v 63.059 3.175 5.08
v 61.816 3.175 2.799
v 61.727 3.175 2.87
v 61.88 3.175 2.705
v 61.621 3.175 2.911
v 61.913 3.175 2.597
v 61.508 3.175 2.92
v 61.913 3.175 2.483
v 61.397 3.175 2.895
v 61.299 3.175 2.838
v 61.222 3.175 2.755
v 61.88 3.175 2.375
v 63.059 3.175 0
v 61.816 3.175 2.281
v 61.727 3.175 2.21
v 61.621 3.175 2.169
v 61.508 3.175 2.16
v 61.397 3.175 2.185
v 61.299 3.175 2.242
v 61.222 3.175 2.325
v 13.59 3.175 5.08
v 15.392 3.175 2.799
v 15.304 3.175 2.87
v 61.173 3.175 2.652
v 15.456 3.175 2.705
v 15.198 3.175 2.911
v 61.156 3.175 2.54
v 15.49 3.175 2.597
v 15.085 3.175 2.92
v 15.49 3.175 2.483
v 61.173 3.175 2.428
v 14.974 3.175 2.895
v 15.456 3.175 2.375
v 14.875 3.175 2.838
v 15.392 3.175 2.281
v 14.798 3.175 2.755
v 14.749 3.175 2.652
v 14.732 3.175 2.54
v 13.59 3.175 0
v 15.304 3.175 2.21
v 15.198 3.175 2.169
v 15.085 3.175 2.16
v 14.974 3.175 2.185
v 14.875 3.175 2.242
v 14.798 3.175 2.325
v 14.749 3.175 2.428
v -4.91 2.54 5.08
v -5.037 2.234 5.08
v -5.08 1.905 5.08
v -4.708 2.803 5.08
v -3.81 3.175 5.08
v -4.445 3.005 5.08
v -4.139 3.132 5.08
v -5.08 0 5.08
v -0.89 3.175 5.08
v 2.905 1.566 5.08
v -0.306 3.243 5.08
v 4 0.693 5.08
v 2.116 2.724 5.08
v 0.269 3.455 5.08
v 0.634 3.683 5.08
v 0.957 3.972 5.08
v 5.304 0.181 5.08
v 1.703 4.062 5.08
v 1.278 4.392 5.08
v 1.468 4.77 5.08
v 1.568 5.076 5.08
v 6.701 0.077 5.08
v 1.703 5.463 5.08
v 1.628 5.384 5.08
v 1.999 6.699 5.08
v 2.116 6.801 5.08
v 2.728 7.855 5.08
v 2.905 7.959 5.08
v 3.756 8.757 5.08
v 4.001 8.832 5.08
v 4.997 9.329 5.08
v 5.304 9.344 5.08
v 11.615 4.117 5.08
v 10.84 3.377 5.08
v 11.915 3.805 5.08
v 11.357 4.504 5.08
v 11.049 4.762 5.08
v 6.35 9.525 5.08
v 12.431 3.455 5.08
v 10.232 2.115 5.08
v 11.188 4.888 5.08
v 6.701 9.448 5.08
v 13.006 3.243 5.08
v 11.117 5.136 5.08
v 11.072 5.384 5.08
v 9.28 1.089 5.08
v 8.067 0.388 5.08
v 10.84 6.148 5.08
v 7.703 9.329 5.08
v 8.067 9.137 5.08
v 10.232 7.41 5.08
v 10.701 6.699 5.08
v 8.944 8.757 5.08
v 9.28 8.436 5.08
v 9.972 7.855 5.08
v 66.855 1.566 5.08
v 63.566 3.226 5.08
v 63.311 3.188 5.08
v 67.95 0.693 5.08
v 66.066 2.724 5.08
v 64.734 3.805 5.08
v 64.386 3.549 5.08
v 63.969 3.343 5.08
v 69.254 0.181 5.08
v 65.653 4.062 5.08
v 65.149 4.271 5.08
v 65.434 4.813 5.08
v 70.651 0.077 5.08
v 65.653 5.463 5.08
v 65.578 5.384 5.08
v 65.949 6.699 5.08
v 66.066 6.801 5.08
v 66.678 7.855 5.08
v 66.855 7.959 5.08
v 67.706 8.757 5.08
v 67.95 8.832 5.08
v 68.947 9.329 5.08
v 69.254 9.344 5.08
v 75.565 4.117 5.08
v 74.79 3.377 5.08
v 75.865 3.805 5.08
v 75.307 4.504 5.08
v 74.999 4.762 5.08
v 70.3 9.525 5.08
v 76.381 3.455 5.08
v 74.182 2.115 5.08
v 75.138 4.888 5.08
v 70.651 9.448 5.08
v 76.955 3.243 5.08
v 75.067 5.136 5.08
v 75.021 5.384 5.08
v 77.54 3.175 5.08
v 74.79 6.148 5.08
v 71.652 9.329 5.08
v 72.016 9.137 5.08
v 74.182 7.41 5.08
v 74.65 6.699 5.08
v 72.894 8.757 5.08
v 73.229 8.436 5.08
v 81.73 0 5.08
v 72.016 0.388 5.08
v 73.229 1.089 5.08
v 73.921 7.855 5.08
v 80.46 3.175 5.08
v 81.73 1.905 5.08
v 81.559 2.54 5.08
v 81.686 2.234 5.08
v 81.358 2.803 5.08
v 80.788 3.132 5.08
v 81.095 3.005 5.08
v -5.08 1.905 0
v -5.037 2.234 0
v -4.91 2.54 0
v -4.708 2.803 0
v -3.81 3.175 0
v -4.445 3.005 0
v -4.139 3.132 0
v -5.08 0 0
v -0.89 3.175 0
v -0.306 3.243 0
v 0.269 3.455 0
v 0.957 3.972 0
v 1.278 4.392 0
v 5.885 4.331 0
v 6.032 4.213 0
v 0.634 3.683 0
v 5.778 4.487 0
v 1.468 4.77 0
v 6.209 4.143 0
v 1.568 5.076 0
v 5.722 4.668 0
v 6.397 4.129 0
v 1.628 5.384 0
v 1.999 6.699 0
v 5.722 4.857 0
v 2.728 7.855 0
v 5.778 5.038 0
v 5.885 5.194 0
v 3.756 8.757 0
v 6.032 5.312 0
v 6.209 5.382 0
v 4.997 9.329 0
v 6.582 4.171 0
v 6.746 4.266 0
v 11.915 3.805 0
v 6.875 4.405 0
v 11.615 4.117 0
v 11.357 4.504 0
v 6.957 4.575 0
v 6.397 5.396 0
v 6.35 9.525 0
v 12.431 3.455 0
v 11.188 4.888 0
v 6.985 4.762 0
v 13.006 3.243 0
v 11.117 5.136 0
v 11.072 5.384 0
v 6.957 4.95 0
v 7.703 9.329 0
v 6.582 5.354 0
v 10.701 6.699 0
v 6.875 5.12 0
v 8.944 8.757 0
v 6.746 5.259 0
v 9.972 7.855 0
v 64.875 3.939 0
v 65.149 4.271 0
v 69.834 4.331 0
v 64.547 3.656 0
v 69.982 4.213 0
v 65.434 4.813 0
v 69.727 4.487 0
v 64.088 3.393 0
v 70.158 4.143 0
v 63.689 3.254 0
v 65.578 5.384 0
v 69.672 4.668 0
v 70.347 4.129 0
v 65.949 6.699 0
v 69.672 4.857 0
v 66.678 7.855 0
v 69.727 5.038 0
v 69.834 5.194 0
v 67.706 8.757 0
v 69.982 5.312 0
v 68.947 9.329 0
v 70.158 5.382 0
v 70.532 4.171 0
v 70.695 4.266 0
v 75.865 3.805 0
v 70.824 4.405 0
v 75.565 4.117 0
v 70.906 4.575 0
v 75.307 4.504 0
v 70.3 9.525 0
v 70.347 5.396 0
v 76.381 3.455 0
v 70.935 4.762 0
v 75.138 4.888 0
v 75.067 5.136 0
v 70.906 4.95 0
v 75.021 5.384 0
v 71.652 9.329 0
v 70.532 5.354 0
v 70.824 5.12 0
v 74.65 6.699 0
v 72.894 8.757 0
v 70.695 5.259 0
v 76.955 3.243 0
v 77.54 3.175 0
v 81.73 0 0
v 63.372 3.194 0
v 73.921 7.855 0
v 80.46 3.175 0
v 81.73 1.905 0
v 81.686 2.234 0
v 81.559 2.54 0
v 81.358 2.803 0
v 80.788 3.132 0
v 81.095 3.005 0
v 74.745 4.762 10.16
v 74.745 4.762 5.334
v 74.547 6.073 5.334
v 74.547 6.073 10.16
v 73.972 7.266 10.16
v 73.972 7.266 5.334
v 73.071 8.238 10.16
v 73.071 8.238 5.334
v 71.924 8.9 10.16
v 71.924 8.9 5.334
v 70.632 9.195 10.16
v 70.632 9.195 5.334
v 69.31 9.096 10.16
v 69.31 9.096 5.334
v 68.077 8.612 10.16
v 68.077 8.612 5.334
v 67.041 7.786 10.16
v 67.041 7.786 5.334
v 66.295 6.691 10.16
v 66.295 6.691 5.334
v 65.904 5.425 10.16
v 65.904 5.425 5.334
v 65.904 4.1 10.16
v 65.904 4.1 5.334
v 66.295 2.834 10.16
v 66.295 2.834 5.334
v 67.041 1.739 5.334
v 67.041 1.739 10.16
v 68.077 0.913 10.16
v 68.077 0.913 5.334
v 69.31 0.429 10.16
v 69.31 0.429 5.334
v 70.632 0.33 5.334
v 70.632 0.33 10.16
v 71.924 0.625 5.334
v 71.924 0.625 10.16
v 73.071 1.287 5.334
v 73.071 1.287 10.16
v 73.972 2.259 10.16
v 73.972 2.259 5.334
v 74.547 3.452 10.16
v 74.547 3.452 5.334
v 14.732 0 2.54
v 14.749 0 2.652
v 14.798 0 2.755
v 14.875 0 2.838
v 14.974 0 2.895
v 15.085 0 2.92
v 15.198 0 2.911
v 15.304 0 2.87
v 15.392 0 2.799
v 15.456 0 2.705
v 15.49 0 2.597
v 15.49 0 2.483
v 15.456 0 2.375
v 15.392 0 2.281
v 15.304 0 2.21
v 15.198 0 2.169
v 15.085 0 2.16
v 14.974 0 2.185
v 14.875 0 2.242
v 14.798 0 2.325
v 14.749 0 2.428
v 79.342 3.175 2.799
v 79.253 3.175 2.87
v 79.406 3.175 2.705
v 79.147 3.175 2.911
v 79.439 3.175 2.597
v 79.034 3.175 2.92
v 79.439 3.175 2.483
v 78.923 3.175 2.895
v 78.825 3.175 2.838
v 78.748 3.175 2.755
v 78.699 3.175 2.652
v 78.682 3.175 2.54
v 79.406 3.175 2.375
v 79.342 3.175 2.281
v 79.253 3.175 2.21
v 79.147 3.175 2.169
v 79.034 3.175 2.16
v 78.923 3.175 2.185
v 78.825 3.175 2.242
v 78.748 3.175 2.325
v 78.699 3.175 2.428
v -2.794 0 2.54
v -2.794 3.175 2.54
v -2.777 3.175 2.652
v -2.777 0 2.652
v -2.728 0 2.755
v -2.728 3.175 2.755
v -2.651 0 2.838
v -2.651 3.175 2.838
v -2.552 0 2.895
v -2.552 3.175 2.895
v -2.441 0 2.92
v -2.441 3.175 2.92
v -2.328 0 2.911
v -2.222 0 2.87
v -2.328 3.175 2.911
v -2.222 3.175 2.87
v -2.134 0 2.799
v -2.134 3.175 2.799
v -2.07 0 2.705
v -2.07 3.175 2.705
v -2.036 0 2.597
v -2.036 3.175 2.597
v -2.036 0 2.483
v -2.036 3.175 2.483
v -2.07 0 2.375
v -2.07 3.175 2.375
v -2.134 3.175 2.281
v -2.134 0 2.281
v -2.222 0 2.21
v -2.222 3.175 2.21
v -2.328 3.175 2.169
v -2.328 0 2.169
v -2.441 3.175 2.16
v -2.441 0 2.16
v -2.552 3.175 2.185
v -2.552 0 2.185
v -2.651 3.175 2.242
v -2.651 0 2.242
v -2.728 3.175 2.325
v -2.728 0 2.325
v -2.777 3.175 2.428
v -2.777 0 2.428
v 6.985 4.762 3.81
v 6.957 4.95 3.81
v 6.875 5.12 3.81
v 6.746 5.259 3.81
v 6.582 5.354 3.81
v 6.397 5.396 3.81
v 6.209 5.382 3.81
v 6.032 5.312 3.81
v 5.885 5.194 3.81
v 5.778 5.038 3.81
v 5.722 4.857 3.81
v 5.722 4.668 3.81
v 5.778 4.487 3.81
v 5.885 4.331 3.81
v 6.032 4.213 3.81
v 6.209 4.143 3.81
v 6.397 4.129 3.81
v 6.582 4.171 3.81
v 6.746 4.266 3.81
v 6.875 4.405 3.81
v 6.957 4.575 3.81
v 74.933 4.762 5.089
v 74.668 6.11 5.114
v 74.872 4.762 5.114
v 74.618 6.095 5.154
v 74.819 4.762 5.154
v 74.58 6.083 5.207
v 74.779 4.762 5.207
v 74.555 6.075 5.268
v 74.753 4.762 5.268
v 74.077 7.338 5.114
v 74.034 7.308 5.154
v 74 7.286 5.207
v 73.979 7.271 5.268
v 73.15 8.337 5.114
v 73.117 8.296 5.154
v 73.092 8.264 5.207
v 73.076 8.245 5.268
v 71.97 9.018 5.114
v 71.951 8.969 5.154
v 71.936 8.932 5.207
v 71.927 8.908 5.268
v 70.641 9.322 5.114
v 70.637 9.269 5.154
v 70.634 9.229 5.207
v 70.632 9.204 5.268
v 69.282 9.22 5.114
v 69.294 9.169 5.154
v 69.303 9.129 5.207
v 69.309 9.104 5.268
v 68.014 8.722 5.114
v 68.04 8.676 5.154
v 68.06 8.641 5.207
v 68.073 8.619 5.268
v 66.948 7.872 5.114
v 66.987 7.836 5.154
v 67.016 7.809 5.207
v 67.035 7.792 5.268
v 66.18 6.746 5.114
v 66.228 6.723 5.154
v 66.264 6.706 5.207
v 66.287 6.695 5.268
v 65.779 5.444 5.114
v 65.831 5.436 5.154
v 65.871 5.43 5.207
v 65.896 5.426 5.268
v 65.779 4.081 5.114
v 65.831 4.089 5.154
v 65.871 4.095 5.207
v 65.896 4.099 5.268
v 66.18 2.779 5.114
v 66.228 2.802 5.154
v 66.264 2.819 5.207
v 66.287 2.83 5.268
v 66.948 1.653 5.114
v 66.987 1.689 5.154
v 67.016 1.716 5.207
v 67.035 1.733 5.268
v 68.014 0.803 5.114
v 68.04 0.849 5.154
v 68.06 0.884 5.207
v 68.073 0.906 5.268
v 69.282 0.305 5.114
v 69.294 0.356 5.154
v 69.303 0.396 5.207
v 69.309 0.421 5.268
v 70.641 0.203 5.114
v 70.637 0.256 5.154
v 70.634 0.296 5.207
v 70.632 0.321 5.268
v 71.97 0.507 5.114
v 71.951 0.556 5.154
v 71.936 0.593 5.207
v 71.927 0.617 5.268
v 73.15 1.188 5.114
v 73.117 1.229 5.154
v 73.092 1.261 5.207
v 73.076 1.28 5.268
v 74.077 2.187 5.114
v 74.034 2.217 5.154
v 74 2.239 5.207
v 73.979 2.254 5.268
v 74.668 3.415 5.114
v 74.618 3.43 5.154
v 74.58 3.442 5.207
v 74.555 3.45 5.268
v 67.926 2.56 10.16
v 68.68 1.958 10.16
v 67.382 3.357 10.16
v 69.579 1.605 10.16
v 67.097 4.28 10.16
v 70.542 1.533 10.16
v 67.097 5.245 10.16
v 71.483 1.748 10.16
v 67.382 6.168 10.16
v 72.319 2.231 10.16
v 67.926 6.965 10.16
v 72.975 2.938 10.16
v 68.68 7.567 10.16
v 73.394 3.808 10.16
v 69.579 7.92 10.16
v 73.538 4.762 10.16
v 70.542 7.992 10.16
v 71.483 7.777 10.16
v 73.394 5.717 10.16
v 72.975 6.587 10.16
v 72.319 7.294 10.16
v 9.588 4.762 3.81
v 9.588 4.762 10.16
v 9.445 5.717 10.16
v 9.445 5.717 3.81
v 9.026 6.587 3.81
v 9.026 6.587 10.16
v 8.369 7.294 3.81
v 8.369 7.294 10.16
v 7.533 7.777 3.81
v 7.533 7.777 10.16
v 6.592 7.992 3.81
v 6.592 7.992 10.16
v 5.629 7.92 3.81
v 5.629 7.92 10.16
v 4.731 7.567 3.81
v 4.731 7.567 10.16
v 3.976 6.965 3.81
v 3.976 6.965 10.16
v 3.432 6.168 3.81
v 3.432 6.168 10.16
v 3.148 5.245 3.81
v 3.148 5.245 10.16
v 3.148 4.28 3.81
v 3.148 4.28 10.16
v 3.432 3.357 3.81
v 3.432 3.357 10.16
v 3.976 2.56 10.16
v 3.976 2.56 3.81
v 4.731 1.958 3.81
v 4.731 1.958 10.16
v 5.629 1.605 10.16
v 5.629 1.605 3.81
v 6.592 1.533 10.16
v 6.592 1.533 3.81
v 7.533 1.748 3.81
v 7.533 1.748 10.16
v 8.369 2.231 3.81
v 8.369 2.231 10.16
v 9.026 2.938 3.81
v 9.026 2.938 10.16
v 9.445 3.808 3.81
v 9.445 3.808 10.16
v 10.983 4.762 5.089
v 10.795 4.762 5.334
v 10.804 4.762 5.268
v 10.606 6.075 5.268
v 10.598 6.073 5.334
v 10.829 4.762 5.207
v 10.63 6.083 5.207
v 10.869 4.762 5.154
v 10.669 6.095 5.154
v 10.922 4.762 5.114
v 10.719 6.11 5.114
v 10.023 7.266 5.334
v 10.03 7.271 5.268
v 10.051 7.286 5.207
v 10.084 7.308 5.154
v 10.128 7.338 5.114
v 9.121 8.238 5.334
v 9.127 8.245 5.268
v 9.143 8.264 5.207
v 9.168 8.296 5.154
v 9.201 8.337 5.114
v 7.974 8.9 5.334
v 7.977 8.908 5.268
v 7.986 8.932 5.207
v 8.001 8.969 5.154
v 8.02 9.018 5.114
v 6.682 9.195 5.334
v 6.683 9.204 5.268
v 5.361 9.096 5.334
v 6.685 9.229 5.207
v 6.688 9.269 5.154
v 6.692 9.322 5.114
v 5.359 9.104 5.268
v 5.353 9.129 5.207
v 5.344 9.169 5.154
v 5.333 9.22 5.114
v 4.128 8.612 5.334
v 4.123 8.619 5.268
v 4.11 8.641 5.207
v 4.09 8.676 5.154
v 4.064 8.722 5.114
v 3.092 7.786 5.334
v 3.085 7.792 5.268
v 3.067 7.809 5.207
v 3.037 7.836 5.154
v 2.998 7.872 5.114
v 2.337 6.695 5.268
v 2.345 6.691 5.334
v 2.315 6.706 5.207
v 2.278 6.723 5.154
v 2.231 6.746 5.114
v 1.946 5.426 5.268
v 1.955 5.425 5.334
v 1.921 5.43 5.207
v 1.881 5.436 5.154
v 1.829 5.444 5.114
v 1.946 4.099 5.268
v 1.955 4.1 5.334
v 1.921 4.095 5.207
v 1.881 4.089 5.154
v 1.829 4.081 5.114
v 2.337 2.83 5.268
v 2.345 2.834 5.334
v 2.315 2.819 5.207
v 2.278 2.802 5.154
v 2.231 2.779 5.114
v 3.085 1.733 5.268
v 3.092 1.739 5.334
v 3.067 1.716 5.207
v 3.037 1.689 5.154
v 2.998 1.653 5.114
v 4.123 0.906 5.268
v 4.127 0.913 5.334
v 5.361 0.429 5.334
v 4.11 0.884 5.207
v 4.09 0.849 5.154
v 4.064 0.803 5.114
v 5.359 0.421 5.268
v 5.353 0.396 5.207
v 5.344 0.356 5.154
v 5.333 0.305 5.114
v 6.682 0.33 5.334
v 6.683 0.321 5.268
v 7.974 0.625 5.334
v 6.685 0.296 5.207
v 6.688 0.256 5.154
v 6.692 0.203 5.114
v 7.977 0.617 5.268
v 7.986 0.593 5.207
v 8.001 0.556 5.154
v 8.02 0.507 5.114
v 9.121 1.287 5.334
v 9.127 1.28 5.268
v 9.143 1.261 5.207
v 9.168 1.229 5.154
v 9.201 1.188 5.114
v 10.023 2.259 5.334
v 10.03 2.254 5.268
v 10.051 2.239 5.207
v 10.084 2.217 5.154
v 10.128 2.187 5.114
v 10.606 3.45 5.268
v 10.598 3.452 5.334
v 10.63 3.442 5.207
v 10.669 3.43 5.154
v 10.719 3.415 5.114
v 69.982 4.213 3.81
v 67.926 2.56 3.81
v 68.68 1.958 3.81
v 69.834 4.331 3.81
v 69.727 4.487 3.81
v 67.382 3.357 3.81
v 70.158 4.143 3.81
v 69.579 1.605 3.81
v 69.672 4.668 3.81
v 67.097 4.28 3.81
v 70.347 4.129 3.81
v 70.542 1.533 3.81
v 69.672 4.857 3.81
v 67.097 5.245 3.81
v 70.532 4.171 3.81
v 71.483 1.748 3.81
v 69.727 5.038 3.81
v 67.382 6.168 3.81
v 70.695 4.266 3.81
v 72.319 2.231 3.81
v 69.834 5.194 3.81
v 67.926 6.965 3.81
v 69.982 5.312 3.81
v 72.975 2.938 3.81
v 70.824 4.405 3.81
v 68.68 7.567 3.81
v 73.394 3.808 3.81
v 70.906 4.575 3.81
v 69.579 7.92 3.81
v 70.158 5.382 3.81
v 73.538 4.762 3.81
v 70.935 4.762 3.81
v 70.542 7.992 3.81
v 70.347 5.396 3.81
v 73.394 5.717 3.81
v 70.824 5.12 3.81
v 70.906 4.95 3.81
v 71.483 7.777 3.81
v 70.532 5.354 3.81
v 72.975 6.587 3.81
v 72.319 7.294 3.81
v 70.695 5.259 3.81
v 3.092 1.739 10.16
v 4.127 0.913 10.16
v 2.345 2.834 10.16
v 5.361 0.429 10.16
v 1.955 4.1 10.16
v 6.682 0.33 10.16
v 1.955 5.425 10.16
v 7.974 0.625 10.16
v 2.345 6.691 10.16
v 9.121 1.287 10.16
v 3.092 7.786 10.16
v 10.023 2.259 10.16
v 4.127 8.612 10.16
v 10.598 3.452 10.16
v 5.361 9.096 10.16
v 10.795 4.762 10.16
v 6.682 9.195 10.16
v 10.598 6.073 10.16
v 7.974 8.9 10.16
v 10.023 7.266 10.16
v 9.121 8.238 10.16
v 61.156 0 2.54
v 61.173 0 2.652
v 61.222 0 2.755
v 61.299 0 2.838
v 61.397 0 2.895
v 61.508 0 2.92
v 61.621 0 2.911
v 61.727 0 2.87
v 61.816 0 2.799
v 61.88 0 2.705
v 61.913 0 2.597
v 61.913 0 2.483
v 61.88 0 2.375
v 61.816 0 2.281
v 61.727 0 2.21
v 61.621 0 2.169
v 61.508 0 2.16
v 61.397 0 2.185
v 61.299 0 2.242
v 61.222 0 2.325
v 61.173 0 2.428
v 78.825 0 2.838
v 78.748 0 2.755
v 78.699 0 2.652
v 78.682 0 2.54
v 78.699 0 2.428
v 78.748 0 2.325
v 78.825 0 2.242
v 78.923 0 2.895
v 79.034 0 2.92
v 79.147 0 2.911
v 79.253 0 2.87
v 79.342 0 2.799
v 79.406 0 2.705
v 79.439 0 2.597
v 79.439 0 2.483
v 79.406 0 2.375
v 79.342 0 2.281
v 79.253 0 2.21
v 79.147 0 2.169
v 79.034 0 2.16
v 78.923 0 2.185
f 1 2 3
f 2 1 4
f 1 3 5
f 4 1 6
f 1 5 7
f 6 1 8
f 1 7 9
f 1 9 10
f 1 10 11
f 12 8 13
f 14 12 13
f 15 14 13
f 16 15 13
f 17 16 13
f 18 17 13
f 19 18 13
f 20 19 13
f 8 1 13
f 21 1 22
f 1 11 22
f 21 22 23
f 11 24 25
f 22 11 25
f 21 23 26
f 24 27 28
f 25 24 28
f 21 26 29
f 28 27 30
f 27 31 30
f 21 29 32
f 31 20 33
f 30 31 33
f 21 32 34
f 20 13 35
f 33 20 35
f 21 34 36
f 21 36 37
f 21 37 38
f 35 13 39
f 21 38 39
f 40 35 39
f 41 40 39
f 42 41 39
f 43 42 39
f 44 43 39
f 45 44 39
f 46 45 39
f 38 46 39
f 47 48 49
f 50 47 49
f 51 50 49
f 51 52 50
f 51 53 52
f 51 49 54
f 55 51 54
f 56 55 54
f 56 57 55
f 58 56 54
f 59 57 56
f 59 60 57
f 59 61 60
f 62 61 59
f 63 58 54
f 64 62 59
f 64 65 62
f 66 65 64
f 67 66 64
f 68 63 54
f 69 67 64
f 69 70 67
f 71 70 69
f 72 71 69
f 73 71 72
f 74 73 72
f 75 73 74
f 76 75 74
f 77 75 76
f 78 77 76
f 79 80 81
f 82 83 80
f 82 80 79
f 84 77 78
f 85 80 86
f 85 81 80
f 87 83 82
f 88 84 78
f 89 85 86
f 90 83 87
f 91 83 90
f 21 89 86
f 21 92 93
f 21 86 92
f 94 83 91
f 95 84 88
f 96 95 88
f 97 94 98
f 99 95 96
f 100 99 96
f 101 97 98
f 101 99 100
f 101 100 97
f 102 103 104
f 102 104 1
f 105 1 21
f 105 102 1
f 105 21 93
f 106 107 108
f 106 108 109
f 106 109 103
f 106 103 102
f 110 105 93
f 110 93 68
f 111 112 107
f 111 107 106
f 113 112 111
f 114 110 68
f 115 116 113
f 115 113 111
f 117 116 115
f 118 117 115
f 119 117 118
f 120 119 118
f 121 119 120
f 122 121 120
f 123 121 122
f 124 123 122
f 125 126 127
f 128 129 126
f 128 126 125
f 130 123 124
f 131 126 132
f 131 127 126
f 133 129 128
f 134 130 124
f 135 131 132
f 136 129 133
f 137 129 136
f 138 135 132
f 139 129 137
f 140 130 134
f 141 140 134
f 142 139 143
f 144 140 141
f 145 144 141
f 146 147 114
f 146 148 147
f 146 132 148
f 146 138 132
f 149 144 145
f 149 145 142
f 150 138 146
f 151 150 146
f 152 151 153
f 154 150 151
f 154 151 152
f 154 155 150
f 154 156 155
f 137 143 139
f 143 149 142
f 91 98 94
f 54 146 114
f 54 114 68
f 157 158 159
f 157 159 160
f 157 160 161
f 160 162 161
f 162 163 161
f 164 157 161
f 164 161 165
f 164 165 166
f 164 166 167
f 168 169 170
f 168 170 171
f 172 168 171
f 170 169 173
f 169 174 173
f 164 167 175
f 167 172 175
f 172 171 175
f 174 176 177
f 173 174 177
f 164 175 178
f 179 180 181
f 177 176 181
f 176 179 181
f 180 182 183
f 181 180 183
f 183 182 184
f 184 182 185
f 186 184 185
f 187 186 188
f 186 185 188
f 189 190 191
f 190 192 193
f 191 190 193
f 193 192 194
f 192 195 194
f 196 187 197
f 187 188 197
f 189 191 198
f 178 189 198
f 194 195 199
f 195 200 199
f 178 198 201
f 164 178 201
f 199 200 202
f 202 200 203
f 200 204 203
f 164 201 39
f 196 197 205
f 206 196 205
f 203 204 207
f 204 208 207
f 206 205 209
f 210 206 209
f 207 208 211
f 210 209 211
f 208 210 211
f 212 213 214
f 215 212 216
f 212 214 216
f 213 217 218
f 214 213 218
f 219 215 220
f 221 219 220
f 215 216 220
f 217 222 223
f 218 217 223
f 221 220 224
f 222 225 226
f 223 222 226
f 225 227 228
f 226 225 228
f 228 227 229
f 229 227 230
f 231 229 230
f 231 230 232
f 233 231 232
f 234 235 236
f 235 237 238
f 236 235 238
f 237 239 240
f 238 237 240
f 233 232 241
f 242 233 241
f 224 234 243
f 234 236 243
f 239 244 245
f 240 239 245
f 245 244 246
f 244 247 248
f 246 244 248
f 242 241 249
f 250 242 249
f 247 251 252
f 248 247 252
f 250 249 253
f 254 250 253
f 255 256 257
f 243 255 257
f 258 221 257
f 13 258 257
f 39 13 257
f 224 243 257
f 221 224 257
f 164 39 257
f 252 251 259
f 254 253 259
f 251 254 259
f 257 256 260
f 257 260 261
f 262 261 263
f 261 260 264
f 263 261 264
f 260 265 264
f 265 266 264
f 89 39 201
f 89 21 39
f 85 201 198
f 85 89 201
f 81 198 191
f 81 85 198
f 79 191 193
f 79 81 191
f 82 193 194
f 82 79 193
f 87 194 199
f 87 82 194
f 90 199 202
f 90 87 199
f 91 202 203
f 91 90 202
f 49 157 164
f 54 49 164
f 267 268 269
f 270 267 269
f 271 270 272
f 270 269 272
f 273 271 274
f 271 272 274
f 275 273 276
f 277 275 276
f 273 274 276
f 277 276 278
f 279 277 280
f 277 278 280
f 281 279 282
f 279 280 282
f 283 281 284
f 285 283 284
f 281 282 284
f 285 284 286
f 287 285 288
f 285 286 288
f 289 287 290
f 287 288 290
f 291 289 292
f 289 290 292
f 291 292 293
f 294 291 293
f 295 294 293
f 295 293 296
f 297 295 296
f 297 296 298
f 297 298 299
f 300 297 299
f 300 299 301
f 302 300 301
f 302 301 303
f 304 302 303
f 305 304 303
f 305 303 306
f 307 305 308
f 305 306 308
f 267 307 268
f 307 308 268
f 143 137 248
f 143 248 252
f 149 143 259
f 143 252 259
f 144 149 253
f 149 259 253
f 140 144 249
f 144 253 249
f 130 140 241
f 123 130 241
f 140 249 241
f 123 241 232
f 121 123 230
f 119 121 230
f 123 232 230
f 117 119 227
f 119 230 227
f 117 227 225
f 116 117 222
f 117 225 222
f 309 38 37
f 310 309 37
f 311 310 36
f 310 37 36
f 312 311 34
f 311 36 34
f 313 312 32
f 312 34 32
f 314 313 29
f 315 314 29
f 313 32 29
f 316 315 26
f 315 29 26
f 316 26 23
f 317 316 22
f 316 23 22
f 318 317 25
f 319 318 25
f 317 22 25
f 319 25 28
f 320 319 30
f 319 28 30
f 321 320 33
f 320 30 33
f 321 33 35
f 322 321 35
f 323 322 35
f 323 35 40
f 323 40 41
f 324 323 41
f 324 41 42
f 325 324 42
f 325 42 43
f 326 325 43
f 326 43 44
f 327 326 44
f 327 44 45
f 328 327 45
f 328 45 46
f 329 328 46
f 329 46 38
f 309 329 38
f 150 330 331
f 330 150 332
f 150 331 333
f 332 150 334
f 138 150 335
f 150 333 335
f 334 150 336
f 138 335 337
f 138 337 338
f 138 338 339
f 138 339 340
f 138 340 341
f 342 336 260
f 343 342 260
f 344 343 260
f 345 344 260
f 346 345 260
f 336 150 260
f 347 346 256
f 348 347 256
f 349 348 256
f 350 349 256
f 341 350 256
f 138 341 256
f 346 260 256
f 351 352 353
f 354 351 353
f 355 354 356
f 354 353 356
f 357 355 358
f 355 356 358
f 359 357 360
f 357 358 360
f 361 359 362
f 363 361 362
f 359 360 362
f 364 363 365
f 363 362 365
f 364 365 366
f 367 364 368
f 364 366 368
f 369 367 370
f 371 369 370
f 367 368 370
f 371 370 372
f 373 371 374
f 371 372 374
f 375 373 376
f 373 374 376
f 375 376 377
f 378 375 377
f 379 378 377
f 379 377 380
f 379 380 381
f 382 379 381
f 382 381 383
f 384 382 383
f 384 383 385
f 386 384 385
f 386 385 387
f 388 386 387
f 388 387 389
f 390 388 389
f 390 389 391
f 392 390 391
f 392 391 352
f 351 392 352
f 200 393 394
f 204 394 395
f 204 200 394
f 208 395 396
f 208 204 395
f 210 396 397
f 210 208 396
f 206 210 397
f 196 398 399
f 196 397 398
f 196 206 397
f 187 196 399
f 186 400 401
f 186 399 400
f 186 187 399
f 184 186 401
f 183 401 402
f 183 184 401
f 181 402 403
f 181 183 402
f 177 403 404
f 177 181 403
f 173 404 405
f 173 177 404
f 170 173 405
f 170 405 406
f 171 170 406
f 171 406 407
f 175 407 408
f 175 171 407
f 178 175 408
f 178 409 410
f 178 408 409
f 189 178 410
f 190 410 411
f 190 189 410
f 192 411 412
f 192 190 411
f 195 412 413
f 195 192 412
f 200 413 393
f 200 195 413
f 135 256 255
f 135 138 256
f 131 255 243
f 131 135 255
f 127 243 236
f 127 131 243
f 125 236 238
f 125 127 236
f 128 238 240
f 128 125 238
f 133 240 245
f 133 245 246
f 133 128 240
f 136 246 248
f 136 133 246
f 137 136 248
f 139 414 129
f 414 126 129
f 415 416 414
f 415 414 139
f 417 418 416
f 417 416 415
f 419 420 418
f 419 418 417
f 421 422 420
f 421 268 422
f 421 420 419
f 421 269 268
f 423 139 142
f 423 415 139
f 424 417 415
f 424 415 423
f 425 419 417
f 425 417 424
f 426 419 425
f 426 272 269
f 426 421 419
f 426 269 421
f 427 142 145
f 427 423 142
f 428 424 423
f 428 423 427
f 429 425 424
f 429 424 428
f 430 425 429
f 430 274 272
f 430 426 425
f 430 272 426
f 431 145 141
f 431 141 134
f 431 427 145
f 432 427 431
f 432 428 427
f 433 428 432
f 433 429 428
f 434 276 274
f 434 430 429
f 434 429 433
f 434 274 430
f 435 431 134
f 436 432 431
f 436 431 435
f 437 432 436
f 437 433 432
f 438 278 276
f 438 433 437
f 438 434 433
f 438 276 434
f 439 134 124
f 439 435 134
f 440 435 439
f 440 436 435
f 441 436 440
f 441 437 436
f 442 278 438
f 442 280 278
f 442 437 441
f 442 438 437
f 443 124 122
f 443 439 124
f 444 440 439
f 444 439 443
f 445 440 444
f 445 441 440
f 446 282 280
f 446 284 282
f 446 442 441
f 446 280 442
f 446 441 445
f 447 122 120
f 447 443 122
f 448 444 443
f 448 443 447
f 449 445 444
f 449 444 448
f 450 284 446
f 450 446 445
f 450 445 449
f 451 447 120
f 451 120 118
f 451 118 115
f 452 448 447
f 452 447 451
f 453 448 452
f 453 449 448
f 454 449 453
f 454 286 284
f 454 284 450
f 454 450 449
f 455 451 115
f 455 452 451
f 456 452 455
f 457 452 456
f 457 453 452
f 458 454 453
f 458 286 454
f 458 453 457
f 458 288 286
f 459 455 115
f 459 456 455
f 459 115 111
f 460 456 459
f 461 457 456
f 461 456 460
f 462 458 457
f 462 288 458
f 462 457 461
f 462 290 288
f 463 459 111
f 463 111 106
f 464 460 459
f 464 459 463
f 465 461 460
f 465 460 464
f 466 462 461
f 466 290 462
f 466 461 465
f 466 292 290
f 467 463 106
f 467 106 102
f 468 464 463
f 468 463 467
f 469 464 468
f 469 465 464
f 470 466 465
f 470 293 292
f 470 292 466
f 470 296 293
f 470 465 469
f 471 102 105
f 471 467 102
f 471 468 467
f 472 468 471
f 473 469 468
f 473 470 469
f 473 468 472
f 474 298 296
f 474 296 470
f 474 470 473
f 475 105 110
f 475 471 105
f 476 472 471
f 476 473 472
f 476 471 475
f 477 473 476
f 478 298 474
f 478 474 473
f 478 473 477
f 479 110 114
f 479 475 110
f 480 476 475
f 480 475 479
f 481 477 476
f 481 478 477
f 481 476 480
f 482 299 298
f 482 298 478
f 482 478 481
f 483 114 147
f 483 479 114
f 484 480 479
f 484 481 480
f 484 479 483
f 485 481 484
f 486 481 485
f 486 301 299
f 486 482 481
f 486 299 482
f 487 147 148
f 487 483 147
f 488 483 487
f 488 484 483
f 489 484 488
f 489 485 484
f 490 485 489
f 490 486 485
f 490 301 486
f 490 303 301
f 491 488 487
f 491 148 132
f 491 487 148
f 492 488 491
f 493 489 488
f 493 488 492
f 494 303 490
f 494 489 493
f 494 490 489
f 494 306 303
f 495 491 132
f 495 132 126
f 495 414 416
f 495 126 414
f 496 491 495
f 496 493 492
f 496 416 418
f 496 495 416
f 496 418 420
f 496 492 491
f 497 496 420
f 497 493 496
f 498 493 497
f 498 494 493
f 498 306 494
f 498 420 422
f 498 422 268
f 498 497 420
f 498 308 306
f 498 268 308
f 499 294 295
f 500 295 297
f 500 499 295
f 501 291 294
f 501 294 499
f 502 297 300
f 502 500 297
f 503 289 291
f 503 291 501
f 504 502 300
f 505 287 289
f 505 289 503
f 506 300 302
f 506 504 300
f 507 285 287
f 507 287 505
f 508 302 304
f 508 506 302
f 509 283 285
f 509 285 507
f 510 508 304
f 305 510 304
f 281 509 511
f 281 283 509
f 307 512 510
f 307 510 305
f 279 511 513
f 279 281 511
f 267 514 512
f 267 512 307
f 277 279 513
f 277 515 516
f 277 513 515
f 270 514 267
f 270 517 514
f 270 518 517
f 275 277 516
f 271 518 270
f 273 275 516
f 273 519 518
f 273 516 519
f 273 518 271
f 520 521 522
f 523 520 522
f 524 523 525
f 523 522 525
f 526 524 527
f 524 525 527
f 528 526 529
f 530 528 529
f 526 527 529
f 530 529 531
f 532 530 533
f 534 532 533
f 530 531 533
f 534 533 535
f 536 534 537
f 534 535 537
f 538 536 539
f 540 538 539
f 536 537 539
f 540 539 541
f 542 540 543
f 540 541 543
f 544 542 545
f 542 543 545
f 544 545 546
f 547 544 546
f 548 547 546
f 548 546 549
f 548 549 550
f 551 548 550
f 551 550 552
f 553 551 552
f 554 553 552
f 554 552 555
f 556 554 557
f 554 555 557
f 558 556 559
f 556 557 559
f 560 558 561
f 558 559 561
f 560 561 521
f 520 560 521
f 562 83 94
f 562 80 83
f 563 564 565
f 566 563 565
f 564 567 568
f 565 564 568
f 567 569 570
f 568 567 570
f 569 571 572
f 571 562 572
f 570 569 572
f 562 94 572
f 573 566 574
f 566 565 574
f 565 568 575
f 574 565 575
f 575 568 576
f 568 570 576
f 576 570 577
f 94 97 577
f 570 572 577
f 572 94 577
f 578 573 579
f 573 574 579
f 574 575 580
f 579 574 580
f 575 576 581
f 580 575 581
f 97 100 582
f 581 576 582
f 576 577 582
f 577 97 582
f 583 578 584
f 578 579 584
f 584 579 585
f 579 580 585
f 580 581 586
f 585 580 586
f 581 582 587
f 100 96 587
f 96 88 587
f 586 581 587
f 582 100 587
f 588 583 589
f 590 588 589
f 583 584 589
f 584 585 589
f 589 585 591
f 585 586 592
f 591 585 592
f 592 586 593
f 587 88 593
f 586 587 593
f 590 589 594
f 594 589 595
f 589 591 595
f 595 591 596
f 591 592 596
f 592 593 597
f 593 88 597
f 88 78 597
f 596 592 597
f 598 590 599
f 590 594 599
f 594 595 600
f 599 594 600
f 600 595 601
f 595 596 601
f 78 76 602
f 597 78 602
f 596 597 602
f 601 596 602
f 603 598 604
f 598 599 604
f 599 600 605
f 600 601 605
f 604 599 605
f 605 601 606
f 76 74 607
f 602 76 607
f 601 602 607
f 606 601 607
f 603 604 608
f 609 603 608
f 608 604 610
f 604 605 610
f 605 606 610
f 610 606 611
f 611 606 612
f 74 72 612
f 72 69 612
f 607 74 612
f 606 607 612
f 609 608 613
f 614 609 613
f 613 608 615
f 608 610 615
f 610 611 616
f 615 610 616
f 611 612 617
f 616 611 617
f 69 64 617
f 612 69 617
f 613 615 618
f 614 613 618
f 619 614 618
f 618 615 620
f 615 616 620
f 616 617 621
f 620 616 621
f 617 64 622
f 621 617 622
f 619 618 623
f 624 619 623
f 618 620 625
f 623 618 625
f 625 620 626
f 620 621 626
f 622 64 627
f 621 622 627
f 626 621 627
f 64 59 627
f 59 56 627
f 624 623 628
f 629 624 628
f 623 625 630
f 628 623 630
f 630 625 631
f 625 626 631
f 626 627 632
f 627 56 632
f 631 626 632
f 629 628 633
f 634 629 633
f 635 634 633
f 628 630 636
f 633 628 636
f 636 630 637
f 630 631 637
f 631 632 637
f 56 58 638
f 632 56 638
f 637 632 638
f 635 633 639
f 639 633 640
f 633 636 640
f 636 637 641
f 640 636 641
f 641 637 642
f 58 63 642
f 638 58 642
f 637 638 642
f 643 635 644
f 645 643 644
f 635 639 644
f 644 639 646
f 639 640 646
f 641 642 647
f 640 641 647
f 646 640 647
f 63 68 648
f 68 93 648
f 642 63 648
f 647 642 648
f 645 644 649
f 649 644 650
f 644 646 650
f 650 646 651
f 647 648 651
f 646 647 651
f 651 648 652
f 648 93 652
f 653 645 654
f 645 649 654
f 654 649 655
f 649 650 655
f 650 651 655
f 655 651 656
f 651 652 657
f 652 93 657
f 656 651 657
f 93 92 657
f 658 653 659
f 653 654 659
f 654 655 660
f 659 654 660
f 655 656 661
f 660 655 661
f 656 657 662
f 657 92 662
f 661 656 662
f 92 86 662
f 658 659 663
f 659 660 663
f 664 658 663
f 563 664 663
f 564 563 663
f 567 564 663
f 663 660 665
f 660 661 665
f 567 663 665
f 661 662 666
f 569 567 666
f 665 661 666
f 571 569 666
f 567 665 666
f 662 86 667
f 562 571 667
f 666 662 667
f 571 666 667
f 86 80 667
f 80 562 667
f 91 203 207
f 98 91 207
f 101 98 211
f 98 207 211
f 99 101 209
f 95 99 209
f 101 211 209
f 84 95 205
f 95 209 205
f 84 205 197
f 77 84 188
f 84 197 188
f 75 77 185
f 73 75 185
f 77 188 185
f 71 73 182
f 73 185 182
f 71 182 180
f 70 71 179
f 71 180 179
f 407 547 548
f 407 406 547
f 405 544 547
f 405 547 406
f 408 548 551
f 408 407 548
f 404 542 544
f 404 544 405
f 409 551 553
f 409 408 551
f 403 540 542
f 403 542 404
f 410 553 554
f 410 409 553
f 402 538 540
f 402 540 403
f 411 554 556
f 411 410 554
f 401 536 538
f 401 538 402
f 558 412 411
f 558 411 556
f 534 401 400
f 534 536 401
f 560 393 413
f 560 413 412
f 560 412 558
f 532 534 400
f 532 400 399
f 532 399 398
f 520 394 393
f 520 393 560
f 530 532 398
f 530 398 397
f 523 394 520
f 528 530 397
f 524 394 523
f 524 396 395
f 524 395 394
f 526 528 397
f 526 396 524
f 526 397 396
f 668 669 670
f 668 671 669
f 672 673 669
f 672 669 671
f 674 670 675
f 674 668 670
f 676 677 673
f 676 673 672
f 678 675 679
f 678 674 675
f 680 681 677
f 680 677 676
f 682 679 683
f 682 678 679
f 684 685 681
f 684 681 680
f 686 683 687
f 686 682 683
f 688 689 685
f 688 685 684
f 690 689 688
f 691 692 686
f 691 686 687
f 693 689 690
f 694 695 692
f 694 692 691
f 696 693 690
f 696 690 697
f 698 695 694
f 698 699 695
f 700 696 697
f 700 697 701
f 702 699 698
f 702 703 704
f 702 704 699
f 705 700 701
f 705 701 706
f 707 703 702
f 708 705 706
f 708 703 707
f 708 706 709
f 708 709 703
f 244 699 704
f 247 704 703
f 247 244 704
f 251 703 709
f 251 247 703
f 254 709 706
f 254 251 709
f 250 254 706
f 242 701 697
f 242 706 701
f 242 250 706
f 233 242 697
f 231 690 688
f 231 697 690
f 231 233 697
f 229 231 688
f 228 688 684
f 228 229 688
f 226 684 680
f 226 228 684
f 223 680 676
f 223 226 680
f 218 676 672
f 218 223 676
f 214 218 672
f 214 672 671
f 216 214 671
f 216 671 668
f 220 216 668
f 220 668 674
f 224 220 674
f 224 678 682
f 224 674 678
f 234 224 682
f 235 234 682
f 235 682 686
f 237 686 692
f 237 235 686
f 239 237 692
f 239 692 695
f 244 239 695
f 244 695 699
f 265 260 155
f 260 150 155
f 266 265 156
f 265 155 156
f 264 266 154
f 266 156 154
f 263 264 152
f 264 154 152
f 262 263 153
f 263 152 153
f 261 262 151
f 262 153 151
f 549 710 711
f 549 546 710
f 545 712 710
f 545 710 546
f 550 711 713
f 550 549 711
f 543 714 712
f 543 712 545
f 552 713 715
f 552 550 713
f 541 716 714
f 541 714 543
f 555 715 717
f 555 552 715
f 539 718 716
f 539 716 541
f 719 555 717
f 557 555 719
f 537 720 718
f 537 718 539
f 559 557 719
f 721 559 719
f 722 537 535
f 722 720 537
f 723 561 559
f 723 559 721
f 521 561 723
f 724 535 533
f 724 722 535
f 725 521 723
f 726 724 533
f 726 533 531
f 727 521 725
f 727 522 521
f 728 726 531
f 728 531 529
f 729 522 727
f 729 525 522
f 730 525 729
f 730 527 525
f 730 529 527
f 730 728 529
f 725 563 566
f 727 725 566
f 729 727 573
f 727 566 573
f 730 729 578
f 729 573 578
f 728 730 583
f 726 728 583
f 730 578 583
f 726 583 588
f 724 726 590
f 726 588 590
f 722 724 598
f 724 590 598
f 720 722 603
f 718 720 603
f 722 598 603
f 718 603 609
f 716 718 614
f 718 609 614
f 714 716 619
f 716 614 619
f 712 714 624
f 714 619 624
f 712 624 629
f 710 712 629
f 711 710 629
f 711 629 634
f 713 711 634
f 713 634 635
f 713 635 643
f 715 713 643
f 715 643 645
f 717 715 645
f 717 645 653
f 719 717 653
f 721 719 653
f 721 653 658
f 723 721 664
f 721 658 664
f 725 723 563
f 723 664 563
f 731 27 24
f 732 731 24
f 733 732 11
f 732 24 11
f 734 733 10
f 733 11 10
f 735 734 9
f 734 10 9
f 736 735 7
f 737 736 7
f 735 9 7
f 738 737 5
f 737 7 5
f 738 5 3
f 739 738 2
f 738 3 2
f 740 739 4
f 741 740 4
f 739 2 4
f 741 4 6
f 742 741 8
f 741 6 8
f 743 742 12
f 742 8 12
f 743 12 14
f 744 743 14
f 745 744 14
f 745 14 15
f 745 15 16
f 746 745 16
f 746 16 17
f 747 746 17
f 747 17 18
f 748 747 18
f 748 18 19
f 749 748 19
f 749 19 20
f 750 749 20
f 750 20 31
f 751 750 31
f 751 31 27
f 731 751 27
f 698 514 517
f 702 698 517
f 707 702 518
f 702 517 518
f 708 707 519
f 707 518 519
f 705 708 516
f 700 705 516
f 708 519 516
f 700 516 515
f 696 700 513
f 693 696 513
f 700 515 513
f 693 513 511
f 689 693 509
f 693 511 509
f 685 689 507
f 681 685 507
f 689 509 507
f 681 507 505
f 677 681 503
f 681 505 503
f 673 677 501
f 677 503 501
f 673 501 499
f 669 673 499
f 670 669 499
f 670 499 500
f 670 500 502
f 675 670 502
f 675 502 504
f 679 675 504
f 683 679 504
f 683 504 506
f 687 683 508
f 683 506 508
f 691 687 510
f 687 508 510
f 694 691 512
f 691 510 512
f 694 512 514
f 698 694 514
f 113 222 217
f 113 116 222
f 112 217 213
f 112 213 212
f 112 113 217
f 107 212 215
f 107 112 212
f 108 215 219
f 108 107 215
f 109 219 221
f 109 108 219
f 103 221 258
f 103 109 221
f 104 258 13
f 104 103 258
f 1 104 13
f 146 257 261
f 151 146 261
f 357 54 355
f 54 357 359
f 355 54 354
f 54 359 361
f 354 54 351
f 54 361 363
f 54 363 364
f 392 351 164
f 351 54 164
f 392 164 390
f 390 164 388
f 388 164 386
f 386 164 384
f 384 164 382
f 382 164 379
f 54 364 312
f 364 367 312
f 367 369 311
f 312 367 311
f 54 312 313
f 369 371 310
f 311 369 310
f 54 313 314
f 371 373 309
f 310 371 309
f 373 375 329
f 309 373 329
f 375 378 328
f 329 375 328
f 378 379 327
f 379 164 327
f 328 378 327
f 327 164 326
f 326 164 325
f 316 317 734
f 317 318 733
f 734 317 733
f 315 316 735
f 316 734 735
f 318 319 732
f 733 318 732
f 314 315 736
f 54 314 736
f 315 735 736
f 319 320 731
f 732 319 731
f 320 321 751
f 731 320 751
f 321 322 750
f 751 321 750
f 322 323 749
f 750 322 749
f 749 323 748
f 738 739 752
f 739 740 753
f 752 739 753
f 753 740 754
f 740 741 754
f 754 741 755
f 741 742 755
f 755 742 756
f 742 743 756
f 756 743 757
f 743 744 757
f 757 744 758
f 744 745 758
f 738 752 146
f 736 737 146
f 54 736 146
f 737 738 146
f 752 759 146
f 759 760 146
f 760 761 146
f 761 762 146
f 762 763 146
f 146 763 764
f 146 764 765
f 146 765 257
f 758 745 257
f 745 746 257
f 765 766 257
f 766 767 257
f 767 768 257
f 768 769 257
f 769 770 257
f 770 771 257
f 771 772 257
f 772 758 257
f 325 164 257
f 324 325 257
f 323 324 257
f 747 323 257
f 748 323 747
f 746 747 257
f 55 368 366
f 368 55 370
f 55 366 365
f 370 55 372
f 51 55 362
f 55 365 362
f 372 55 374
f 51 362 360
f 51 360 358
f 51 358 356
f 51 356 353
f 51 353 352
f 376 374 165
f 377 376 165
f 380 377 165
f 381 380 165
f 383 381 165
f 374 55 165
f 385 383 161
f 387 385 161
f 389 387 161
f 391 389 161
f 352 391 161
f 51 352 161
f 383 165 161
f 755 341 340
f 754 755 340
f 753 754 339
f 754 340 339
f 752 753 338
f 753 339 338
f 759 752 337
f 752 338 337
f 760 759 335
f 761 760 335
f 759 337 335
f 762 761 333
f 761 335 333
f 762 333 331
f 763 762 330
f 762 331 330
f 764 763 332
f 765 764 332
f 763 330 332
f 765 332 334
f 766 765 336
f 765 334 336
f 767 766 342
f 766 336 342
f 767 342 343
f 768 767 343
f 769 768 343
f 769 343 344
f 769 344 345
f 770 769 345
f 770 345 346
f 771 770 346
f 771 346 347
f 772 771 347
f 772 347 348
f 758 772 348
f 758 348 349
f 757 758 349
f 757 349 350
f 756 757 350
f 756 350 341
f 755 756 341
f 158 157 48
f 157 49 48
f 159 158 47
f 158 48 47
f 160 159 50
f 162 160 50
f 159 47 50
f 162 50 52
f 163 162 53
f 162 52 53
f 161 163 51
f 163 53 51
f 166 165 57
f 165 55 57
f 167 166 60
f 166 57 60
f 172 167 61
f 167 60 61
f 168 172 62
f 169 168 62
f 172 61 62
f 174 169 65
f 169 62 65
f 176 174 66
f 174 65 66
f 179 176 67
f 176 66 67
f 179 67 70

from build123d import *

# Parameters (mm, degrees)
SKETCH1_R           = 0.635
BOSS_EXTRUDE1_DEPTH = 5.08
SKETCH2_R           = 4.445
SKETCH2_R_2         = 0.635
BOSS_EXTRUDE2_DEPTH = 5.08
SKETCH3_R           = 3.2385
CUT_EXTRUDE1_DEPTH  = 6.35
FILLET1_R           = 0.254
FILLET2_R           = 2.54
FILLET3_R           = 1.27
SKETCH5_R           = 0.381
CUT_EXTRUDE3_DEPTH  = 83.603101422


with BuildPart() as part:
    # Sketch1 → Boss-Extrude1 (new body)
    with BuildSketch(Plane.XY):
        with BuildLine():
            Line((0, 0), (76.64958, 0))
            Line((76.64958, 0), (81.72958, 0))
            Line((81.72958, 0), (81.72958, 3.175))
            Line((81.72958, 3.175), (76.64958, 3.175))
            Line((76.64958, 3.175), (75.06208, 3.175))
            Line((75.06208, 3.175), (75.06208, 4.7625))
            ThreePointArc((75.06208, 4.7625), (70.29958, 9.525), (65.53708, 4.7625))
            Line((65.53708, 4.7625), (65.53708, 3.175))
            Line((65.53708, 3.175), (11.1125, 3.175))
            Line((11.1125, 3.175), (11.1125, 4.7625))
            ThreePointArc((11.1125, 4.7625), (6.35, 9.525), (1.5875, 4.7625))
            Line((1.5875, 4.7625), (1.5875, 3.175))
            Line((1.5875, 3.175), (0, 3.175))
            Line((0, 3.175), (-5.08, 3.175))
            Line((-5.08, 3.175), (-5.08, 0))
            Line((-5.08, 0), (0, 0))
        make_face()
        with Locations((6.35, 4.7625)):
            Circle(SKETCH1_R, mode=Mode.SUBTRACT)
        with Locations((70.29958, 4.7625)):
            Circle(SKETCH1_R, mode=Mode.SUBTRACT)
    extrude(amount=BOSS_EXTRUDE1_DEPTH)

    # Sketch2 → Boss-Extrude2 (add)
    # profile 1 of 2: a face of its own
    with BuildSketch(Plane.XY.offset(5.08)):
        with Locations((6.35, 4.7625)):
            Circle(SKETCH2_R)
        with Locations((6.35, 4.7625)):
            Circle(SKETCH2_R_2, mode=Mode.SUBTRACT)
    # profile 2 of 2: a face of its own
    with BuildSketch(Plane.XY.offset(5.08)):
        with Locations((70.29958, 4.7625)):
            Circle(SKETCH2_R)
        with Locations((70.29958, 4.7625)):
            Circle(SKETCH2_R_2, mode=Mode.SUBTRACT)
    extrude(amount=BOSS_EXTRUDE2_DEPTH)

    # Sketch3 → Cut-Extrude1 (cut)
    with BuildSketch(Plane.XY.offset(10.16)):
        with Locations((6.35, 4.7625)):
            Circle(SKETCH3_R)
        with Locations((70.29958, 4.7625)):
            Circle(SKETCH3_R)
    extrude(amount=-CUT_EXTRUDE1_DEPTH, mode=Mode.SUBTRACT)

    # Fillet1
    fillet1_edges = [part.edges().sort_by_distance(p)[0] for p in [
        (1.905, 4.7625, 5.08),
        (65.85458, 4.7625, 5.08),
    ]]
    fillet(fillet1_edges, radius=FILLET1_R)

    # Fillet2
    fillet2_edges = [part.edges().sort_by_distance(p)[0] for p in [
        (75.06208, 3.175, 2.54),
        (11.1125, 3.175, 2.54),
        (65.53708, 3.175, 2.54),
        (1.5875, 3.175, 2.54),
    ]]
    fillet(fillet2_edges, radius=FILLET2_R)

    # Fillet3
    fillet3_edges = [part.edges().sort_by_distance(p)[0] for p in [
        (-5.08, 3.175, 2.54),
        (81.72958, 3.175, 2.54),
    ]]
    fillet(fillet3_edges, radius=FILLET3_R)

    # Sketch5 → Cut-Extrude3 (cut, through all)
    with BuildSketch(Plane(origin=(0, 3.175, 0), x_dir=(1, 0, 0), z_dir=(0, 1, 0))):
        with Locations(Location((-2.413, -2.54, 0), (0, 0, 180))):
            Circle(SKETCH5_R)
        with Locations(Location((79.06258, -2.54, 0), (0, 0, 180))):
            Circle(SKETCH5_R)
        with Locations(Location((61.53658, -2.54, 0), (0, 0, 180))):
            Circle(SKETCH5_R)
        with Locations(Location((15.113, -2.54, 0), (0, 0, 180))):
            Circle(SKETCH5_R)
    extrude(amount=-CUT_EXTRUDE3_DEPTH, mode=Mode.SUBTRACT)


solid = part.part
